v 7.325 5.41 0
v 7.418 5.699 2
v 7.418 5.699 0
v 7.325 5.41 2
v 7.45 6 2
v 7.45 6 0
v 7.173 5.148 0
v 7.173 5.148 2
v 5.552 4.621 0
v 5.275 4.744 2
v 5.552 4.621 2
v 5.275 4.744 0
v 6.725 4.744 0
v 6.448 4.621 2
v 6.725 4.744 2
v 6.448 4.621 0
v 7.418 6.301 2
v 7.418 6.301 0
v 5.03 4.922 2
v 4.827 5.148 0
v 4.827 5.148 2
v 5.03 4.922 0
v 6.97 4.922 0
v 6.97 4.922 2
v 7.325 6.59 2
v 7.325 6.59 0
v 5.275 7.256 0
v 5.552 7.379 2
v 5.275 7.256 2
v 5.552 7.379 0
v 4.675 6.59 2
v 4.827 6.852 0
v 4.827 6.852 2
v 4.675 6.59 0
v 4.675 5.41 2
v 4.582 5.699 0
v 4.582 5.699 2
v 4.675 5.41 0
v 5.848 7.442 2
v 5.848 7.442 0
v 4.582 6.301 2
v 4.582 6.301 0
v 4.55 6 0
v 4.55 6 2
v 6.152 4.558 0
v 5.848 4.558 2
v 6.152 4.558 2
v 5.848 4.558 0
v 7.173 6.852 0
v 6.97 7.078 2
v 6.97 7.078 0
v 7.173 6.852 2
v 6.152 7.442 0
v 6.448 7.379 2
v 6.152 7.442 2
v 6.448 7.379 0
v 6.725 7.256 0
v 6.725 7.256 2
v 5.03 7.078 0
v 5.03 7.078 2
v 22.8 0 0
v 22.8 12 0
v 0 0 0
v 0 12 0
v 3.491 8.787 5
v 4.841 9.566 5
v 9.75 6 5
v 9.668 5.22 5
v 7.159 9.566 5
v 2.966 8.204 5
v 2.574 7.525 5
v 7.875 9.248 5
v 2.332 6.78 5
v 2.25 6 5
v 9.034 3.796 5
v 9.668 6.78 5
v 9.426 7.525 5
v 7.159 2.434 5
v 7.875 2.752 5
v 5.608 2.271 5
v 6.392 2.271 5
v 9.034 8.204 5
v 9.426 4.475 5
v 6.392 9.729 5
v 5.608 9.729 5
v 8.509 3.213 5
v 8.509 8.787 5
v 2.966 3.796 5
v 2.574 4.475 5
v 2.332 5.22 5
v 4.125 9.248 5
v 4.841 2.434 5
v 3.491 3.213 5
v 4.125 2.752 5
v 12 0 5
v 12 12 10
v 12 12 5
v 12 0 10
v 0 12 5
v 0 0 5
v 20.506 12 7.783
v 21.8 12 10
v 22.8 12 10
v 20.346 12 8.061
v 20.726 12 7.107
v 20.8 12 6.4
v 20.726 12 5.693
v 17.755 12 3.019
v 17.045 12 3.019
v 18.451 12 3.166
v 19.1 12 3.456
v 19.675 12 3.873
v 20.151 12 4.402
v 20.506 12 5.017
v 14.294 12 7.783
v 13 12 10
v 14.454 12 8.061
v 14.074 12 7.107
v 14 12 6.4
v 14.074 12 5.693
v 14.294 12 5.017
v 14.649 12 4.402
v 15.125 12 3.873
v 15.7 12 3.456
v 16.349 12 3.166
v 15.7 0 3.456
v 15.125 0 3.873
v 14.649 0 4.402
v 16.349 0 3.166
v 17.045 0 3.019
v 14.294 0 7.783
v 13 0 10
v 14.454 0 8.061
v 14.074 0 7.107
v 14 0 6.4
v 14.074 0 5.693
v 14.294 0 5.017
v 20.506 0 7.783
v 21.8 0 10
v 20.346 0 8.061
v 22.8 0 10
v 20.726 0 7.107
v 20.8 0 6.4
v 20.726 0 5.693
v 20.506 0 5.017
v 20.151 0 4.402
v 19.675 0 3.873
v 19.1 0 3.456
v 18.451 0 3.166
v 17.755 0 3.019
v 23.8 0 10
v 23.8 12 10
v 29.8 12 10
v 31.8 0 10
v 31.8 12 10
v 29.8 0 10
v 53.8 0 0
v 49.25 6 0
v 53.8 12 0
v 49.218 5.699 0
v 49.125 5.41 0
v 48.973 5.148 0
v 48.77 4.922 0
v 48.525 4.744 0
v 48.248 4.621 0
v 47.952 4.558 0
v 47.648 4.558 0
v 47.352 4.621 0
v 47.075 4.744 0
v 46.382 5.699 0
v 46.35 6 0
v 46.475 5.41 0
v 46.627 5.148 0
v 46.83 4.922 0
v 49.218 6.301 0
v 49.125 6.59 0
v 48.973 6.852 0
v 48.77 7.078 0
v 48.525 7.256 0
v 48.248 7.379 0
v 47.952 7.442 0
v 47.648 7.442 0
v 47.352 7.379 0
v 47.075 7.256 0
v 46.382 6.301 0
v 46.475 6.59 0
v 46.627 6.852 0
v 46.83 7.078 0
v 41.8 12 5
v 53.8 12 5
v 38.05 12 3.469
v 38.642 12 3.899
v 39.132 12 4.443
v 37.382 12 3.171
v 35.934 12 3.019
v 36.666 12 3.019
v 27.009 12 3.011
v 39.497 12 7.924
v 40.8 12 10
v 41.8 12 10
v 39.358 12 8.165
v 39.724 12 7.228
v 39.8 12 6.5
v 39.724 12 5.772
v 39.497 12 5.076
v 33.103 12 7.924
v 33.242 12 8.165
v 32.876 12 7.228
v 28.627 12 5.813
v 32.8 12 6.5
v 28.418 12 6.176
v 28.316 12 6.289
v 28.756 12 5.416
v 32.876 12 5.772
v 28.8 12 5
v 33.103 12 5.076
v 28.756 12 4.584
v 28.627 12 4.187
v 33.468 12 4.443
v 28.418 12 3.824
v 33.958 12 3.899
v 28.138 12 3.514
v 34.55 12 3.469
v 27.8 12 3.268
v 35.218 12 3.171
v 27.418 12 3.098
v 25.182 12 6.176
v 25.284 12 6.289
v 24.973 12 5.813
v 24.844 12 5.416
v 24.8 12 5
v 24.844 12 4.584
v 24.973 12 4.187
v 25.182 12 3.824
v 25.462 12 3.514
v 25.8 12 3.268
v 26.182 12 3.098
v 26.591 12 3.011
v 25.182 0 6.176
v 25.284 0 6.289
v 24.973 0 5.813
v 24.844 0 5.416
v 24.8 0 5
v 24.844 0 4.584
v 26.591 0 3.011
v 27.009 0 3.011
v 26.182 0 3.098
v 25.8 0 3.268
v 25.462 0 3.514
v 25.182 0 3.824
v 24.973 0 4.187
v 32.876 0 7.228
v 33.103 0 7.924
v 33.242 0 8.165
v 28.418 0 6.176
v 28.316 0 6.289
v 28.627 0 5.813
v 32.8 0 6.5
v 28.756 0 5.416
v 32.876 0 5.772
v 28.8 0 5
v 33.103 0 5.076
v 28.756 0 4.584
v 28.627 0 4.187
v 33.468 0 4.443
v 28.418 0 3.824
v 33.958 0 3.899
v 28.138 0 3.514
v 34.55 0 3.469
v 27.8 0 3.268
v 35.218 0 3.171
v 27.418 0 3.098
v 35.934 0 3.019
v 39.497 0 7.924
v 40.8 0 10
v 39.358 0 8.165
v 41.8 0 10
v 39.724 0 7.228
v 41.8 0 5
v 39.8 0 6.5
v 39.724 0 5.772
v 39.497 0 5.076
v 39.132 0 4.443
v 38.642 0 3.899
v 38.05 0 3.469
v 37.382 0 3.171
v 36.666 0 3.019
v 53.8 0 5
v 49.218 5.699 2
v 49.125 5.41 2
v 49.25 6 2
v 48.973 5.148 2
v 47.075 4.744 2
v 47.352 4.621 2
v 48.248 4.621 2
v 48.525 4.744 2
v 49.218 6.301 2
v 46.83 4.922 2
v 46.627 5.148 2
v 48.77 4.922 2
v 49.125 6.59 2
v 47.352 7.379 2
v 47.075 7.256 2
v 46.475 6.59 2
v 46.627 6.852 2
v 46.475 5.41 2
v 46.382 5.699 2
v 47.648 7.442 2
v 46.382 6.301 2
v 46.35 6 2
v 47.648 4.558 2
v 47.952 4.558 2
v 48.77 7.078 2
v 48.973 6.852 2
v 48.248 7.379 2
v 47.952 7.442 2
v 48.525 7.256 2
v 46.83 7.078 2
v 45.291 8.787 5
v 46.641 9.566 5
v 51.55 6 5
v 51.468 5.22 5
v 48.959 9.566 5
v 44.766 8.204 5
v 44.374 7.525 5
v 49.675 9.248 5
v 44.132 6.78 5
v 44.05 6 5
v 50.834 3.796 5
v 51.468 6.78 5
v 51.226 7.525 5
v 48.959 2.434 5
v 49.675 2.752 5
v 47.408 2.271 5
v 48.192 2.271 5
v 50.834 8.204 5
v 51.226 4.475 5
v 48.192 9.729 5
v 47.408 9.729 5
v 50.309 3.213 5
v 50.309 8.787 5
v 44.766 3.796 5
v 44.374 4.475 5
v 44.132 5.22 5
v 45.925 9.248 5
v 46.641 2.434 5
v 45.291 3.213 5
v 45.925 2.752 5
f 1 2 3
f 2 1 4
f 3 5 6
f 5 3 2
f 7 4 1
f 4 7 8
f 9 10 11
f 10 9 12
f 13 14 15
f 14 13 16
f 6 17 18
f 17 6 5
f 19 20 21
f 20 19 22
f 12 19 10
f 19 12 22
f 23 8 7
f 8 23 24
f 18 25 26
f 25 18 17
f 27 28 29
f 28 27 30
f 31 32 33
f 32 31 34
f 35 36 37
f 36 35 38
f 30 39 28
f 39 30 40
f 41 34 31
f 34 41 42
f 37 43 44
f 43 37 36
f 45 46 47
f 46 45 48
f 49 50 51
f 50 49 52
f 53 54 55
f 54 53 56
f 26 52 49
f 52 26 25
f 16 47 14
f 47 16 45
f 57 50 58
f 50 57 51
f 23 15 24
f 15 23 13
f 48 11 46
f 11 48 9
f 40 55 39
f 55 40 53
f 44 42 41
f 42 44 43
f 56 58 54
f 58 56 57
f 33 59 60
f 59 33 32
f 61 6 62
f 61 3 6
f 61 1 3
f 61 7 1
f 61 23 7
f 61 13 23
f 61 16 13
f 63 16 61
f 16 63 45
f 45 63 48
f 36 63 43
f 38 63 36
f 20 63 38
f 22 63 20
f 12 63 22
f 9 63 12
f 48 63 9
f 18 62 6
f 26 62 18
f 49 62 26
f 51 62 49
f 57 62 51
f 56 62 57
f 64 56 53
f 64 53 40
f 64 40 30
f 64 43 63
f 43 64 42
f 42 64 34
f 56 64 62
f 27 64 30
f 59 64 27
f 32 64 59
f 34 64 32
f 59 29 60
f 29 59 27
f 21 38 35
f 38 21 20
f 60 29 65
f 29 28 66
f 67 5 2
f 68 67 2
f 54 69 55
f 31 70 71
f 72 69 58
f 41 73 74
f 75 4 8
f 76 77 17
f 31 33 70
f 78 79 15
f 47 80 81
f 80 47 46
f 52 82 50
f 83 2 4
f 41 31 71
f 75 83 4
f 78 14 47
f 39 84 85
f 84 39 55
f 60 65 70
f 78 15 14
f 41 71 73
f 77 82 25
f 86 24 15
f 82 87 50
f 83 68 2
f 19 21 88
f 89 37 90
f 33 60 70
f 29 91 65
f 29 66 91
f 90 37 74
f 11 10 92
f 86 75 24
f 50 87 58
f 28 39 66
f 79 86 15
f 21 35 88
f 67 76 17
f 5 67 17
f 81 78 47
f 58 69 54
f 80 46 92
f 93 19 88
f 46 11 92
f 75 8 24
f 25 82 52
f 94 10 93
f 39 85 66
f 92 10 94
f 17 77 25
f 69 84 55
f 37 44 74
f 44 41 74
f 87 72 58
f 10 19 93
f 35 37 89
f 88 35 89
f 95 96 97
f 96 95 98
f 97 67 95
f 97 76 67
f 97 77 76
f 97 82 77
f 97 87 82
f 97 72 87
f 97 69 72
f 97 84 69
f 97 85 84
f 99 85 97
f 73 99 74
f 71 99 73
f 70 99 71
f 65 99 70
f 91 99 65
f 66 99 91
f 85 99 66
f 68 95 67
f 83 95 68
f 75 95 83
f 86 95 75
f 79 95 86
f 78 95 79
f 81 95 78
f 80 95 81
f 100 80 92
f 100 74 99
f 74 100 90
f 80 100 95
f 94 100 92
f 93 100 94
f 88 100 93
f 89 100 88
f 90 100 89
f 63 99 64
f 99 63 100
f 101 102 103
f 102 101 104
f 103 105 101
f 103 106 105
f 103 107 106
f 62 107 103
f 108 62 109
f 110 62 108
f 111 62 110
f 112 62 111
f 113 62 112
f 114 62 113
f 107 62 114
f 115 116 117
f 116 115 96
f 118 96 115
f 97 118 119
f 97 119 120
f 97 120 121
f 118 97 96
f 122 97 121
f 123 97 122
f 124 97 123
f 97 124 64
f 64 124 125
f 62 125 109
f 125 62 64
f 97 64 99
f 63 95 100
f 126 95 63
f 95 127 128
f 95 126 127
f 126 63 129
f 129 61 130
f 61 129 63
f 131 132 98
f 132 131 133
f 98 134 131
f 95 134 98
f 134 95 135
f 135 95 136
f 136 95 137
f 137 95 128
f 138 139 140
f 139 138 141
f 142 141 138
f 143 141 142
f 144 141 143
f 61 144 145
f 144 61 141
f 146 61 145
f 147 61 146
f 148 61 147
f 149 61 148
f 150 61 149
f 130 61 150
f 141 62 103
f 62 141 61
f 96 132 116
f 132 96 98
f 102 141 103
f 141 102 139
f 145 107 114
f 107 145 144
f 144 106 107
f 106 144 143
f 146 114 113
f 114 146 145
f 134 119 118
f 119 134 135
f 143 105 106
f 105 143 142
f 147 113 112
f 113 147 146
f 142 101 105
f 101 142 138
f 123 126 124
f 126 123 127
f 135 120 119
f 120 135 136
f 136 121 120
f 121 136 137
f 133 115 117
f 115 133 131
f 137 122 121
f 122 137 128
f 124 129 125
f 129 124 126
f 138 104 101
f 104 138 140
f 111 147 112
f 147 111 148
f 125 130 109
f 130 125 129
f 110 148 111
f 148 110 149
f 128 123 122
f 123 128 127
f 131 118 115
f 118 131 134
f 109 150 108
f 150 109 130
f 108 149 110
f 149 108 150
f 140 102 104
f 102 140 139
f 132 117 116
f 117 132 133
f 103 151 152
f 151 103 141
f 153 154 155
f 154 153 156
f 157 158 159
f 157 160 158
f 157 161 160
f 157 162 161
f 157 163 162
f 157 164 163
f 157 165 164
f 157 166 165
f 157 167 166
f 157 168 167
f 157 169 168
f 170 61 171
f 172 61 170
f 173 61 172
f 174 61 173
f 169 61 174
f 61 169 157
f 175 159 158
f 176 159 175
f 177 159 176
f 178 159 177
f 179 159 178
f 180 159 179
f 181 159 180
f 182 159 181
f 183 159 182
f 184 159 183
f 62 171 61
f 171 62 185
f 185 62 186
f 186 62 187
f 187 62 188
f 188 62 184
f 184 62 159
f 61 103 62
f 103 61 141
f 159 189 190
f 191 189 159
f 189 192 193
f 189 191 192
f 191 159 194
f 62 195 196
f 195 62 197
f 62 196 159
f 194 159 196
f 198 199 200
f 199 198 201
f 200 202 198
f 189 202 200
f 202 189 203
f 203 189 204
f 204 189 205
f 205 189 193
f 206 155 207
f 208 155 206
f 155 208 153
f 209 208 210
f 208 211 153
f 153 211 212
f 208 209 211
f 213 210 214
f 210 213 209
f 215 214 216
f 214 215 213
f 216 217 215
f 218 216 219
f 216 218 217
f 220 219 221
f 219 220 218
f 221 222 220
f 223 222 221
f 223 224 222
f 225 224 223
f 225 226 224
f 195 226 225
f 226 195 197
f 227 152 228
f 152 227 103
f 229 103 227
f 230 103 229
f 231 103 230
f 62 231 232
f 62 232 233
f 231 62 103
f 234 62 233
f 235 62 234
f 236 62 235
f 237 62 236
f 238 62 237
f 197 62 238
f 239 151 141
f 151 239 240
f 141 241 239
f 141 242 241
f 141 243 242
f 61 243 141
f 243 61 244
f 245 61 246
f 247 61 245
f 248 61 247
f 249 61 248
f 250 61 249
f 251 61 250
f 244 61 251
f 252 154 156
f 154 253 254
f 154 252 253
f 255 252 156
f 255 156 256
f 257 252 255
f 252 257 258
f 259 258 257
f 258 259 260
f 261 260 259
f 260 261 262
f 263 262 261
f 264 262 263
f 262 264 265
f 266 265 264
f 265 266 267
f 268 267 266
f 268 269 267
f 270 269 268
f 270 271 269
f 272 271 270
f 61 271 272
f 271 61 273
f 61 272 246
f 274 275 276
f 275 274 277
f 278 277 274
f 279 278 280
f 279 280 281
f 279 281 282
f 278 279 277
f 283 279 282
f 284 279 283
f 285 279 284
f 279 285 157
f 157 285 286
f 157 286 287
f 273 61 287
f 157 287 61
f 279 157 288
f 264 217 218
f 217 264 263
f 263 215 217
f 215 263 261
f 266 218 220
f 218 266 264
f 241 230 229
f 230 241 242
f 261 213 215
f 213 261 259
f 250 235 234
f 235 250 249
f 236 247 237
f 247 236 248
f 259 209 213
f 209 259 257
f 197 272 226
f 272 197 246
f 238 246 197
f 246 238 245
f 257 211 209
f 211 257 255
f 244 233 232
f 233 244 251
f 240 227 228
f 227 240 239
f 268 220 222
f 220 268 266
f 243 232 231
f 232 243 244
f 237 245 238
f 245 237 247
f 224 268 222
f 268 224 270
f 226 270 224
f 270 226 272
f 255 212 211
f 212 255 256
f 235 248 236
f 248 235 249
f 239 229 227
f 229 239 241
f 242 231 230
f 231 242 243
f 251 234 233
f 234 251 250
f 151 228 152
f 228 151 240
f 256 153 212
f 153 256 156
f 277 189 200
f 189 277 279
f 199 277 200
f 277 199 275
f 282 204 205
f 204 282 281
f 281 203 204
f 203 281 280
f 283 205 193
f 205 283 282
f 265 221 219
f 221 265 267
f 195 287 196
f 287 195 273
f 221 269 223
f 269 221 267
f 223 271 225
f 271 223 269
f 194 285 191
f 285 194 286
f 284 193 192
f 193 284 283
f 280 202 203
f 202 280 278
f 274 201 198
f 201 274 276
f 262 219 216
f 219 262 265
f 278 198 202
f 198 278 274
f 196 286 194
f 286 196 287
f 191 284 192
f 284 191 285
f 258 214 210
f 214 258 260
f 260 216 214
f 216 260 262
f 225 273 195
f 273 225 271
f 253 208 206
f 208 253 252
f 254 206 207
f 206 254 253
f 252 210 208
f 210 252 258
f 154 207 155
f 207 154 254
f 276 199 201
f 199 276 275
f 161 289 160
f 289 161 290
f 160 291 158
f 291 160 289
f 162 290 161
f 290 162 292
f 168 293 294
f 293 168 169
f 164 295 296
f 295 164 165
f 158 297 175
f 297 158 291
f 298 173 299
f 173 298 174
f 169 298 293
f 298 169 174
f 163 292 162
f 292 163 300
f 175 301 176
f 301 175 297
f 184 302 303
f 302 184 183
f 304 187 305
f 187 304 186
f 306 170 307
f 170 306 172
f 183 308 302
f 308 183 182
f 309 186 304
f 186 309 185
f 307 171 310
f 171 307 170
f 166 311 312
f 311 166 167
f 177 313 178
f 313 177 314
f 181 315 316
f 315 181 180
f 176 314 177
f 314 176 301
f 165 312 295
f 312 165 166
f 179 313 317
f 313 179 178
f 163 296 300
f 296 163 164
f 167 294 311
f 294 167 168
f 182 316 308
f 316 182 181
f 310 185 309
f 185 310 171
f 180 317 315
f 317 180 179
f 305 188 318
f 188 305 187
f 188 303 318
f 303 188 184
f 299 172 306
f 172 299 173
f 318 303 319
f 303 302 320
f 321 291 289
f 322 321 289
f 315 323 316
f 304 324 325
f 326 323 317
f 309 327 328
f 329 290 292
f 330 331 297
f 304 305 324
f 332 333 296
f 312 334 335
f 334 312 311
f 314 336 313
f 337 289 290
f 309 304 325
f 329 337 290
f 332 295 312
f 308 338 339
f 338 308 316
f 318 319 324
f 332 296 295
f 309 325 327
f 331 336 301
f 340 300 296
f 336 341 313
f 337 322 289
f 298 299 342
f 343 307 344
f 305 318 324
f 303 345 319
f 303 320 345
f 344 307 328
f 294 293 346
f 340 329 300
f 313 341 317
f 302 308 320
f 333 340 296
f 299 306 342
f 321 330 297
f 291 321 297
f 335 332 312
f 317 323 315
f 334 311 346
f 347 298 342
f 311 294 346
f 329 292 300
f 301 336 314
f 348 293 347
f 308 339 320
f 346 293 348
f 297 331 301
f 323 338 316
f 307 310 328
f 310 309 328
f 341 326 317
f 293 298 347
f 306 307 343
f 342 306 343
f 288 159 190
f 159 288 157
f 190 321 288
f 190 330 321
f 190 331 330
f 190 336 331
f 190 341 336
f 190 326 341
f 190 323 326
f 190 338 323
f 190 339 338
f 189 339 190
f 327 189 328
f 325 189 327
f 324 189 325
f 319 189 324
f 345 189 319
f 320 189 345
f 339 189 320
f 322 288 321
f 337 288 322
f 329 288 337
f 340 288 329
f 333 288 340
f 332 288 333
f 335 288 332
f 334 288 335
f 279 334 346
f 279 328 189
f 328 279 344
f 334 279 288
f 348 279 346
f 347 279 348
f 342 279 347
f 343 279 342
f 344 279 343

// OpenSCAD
// file: ../Parts/Vruty.scad
$fn = 30;

module otvorVrut(dlzka, priemer, hlavaPriemer, hlavaVyska, zapustenie=2) {
    union() {
        cylinder(h = dlzka, d = priemer);
        cylinder(h = hlavaVyska, d1 = hlavaPriemer, d2 = priemer);
        translate([0,0,-zapustenie]) cylinder(h = zapustenie, d = hlavaPriemer);
    }
}

module otvorVrut4mm(dlzka = 20, zapustenie=2) {
    otvorVrut(dlzka, priemer = 3.4, hlavaPriemer = 8.5, hlavaVyska = 3.2, zapustenie=zapustenie);
}

module otvorVrut3_5mm(dlzka = 20, zapustenie=2) {
    otvorVrut(dlzka, priemer = 2.9, hlavaPriemer = 7.5, hlavaVyska = 3, zapustenie=zapustenie);
}

module otvorVrut3mm(dlzka = 20, zapustenie=2) {
    otvorVrut(dlzka, priemer = 2.4, hlavaPriemer = 6.4, hlavaVyska = 2.2, zapustenie=zapustenie);
}

module testBlok() {
    difference() {
        translate([-8,-6,0]) cube([40,21,7]);

        translate([0,13,0]) union() {
            otvorVrut4mm();
            translate([12, 0, 0]) otvorVrut3_5mm();
            translate([24, 0, 0]) otvorVrut3mm();

        }

        union() {
            otvorVrut4mm();
            translate([12, 0, 0]) otvorVrut3_5mm();
            translate([24, 0, 0]) otvorVrut3mm();
        }
    }
}

testBlok();
// main file
use <../Parts/Vruty.scad>

sirka = 12; // sirka bloku a jednotlivych komponentov
v1 = 3;  // vyska zakladne
v2 = 6;  // vyska klipu pre kabel

$fn=30;

// Blok pre uchytenie kabla
module kabel(priemer, vyska=10) {
    polomer = priemer/2;
    dlzka = priemer+4;
    zoffset = v1+0.5*priemer;
//    vyska = v1+priemer+v2;
    difference() {
        cube([dlzka, sirka, vyska]);
        translate([dlzka/2, 0, zoffset]) rotate([270, 0, 0]) cylinder(d = priemer, h = sirka);
        hull() {
            translate([dlzka/2, 0, zoffset]) rotate([0, 0, 0]) cylinder(d1 = priemer*0.5, d2 = priemer+2, h = vyska-zoffset);
            translate([dlzka/2, sirka, zoffset]) rotate([0, 0, 0]) cylinder(d1 = priemer*0.5, d2 = priemer+2, h = vyska-zoffset);
        }
    }
    if ($children)
        translate([dlzka, 0, 0])
            children();
}

// Blok pre vrut
module vrut(priemer, offset) {
    dlzkaBlokuPreVrut = 12;
    vyskaVrut = v1 + 2;
    difference() {
        cube([dlzkaBlokuPreVrut, sirka, vyskaVrut]);
        translate([dlzkaBlokuPreVrut / 2, sirka / 2, vyskaVrut]) rotate([180, 0, 0]) otvorVrut3_5mm(vyskaVrut);
    }
    if ($children)
        translate([dlzkaBlokuPreVrut, 0, 0])
            children();
}

//!kabel(6);

// Naskladaj komponenty. Kazdy dalsi komponent musi byt child predchadzajuceho - t.j. nedavat bodkociarku.
translate([0,30,0])
kabel(3.1, 8)
vrut()
kabel(6.9, 10);

// 7 3.7  7
!vrut()
kabel(6.8)
kabel(4)
kabel(7)
vrut();
